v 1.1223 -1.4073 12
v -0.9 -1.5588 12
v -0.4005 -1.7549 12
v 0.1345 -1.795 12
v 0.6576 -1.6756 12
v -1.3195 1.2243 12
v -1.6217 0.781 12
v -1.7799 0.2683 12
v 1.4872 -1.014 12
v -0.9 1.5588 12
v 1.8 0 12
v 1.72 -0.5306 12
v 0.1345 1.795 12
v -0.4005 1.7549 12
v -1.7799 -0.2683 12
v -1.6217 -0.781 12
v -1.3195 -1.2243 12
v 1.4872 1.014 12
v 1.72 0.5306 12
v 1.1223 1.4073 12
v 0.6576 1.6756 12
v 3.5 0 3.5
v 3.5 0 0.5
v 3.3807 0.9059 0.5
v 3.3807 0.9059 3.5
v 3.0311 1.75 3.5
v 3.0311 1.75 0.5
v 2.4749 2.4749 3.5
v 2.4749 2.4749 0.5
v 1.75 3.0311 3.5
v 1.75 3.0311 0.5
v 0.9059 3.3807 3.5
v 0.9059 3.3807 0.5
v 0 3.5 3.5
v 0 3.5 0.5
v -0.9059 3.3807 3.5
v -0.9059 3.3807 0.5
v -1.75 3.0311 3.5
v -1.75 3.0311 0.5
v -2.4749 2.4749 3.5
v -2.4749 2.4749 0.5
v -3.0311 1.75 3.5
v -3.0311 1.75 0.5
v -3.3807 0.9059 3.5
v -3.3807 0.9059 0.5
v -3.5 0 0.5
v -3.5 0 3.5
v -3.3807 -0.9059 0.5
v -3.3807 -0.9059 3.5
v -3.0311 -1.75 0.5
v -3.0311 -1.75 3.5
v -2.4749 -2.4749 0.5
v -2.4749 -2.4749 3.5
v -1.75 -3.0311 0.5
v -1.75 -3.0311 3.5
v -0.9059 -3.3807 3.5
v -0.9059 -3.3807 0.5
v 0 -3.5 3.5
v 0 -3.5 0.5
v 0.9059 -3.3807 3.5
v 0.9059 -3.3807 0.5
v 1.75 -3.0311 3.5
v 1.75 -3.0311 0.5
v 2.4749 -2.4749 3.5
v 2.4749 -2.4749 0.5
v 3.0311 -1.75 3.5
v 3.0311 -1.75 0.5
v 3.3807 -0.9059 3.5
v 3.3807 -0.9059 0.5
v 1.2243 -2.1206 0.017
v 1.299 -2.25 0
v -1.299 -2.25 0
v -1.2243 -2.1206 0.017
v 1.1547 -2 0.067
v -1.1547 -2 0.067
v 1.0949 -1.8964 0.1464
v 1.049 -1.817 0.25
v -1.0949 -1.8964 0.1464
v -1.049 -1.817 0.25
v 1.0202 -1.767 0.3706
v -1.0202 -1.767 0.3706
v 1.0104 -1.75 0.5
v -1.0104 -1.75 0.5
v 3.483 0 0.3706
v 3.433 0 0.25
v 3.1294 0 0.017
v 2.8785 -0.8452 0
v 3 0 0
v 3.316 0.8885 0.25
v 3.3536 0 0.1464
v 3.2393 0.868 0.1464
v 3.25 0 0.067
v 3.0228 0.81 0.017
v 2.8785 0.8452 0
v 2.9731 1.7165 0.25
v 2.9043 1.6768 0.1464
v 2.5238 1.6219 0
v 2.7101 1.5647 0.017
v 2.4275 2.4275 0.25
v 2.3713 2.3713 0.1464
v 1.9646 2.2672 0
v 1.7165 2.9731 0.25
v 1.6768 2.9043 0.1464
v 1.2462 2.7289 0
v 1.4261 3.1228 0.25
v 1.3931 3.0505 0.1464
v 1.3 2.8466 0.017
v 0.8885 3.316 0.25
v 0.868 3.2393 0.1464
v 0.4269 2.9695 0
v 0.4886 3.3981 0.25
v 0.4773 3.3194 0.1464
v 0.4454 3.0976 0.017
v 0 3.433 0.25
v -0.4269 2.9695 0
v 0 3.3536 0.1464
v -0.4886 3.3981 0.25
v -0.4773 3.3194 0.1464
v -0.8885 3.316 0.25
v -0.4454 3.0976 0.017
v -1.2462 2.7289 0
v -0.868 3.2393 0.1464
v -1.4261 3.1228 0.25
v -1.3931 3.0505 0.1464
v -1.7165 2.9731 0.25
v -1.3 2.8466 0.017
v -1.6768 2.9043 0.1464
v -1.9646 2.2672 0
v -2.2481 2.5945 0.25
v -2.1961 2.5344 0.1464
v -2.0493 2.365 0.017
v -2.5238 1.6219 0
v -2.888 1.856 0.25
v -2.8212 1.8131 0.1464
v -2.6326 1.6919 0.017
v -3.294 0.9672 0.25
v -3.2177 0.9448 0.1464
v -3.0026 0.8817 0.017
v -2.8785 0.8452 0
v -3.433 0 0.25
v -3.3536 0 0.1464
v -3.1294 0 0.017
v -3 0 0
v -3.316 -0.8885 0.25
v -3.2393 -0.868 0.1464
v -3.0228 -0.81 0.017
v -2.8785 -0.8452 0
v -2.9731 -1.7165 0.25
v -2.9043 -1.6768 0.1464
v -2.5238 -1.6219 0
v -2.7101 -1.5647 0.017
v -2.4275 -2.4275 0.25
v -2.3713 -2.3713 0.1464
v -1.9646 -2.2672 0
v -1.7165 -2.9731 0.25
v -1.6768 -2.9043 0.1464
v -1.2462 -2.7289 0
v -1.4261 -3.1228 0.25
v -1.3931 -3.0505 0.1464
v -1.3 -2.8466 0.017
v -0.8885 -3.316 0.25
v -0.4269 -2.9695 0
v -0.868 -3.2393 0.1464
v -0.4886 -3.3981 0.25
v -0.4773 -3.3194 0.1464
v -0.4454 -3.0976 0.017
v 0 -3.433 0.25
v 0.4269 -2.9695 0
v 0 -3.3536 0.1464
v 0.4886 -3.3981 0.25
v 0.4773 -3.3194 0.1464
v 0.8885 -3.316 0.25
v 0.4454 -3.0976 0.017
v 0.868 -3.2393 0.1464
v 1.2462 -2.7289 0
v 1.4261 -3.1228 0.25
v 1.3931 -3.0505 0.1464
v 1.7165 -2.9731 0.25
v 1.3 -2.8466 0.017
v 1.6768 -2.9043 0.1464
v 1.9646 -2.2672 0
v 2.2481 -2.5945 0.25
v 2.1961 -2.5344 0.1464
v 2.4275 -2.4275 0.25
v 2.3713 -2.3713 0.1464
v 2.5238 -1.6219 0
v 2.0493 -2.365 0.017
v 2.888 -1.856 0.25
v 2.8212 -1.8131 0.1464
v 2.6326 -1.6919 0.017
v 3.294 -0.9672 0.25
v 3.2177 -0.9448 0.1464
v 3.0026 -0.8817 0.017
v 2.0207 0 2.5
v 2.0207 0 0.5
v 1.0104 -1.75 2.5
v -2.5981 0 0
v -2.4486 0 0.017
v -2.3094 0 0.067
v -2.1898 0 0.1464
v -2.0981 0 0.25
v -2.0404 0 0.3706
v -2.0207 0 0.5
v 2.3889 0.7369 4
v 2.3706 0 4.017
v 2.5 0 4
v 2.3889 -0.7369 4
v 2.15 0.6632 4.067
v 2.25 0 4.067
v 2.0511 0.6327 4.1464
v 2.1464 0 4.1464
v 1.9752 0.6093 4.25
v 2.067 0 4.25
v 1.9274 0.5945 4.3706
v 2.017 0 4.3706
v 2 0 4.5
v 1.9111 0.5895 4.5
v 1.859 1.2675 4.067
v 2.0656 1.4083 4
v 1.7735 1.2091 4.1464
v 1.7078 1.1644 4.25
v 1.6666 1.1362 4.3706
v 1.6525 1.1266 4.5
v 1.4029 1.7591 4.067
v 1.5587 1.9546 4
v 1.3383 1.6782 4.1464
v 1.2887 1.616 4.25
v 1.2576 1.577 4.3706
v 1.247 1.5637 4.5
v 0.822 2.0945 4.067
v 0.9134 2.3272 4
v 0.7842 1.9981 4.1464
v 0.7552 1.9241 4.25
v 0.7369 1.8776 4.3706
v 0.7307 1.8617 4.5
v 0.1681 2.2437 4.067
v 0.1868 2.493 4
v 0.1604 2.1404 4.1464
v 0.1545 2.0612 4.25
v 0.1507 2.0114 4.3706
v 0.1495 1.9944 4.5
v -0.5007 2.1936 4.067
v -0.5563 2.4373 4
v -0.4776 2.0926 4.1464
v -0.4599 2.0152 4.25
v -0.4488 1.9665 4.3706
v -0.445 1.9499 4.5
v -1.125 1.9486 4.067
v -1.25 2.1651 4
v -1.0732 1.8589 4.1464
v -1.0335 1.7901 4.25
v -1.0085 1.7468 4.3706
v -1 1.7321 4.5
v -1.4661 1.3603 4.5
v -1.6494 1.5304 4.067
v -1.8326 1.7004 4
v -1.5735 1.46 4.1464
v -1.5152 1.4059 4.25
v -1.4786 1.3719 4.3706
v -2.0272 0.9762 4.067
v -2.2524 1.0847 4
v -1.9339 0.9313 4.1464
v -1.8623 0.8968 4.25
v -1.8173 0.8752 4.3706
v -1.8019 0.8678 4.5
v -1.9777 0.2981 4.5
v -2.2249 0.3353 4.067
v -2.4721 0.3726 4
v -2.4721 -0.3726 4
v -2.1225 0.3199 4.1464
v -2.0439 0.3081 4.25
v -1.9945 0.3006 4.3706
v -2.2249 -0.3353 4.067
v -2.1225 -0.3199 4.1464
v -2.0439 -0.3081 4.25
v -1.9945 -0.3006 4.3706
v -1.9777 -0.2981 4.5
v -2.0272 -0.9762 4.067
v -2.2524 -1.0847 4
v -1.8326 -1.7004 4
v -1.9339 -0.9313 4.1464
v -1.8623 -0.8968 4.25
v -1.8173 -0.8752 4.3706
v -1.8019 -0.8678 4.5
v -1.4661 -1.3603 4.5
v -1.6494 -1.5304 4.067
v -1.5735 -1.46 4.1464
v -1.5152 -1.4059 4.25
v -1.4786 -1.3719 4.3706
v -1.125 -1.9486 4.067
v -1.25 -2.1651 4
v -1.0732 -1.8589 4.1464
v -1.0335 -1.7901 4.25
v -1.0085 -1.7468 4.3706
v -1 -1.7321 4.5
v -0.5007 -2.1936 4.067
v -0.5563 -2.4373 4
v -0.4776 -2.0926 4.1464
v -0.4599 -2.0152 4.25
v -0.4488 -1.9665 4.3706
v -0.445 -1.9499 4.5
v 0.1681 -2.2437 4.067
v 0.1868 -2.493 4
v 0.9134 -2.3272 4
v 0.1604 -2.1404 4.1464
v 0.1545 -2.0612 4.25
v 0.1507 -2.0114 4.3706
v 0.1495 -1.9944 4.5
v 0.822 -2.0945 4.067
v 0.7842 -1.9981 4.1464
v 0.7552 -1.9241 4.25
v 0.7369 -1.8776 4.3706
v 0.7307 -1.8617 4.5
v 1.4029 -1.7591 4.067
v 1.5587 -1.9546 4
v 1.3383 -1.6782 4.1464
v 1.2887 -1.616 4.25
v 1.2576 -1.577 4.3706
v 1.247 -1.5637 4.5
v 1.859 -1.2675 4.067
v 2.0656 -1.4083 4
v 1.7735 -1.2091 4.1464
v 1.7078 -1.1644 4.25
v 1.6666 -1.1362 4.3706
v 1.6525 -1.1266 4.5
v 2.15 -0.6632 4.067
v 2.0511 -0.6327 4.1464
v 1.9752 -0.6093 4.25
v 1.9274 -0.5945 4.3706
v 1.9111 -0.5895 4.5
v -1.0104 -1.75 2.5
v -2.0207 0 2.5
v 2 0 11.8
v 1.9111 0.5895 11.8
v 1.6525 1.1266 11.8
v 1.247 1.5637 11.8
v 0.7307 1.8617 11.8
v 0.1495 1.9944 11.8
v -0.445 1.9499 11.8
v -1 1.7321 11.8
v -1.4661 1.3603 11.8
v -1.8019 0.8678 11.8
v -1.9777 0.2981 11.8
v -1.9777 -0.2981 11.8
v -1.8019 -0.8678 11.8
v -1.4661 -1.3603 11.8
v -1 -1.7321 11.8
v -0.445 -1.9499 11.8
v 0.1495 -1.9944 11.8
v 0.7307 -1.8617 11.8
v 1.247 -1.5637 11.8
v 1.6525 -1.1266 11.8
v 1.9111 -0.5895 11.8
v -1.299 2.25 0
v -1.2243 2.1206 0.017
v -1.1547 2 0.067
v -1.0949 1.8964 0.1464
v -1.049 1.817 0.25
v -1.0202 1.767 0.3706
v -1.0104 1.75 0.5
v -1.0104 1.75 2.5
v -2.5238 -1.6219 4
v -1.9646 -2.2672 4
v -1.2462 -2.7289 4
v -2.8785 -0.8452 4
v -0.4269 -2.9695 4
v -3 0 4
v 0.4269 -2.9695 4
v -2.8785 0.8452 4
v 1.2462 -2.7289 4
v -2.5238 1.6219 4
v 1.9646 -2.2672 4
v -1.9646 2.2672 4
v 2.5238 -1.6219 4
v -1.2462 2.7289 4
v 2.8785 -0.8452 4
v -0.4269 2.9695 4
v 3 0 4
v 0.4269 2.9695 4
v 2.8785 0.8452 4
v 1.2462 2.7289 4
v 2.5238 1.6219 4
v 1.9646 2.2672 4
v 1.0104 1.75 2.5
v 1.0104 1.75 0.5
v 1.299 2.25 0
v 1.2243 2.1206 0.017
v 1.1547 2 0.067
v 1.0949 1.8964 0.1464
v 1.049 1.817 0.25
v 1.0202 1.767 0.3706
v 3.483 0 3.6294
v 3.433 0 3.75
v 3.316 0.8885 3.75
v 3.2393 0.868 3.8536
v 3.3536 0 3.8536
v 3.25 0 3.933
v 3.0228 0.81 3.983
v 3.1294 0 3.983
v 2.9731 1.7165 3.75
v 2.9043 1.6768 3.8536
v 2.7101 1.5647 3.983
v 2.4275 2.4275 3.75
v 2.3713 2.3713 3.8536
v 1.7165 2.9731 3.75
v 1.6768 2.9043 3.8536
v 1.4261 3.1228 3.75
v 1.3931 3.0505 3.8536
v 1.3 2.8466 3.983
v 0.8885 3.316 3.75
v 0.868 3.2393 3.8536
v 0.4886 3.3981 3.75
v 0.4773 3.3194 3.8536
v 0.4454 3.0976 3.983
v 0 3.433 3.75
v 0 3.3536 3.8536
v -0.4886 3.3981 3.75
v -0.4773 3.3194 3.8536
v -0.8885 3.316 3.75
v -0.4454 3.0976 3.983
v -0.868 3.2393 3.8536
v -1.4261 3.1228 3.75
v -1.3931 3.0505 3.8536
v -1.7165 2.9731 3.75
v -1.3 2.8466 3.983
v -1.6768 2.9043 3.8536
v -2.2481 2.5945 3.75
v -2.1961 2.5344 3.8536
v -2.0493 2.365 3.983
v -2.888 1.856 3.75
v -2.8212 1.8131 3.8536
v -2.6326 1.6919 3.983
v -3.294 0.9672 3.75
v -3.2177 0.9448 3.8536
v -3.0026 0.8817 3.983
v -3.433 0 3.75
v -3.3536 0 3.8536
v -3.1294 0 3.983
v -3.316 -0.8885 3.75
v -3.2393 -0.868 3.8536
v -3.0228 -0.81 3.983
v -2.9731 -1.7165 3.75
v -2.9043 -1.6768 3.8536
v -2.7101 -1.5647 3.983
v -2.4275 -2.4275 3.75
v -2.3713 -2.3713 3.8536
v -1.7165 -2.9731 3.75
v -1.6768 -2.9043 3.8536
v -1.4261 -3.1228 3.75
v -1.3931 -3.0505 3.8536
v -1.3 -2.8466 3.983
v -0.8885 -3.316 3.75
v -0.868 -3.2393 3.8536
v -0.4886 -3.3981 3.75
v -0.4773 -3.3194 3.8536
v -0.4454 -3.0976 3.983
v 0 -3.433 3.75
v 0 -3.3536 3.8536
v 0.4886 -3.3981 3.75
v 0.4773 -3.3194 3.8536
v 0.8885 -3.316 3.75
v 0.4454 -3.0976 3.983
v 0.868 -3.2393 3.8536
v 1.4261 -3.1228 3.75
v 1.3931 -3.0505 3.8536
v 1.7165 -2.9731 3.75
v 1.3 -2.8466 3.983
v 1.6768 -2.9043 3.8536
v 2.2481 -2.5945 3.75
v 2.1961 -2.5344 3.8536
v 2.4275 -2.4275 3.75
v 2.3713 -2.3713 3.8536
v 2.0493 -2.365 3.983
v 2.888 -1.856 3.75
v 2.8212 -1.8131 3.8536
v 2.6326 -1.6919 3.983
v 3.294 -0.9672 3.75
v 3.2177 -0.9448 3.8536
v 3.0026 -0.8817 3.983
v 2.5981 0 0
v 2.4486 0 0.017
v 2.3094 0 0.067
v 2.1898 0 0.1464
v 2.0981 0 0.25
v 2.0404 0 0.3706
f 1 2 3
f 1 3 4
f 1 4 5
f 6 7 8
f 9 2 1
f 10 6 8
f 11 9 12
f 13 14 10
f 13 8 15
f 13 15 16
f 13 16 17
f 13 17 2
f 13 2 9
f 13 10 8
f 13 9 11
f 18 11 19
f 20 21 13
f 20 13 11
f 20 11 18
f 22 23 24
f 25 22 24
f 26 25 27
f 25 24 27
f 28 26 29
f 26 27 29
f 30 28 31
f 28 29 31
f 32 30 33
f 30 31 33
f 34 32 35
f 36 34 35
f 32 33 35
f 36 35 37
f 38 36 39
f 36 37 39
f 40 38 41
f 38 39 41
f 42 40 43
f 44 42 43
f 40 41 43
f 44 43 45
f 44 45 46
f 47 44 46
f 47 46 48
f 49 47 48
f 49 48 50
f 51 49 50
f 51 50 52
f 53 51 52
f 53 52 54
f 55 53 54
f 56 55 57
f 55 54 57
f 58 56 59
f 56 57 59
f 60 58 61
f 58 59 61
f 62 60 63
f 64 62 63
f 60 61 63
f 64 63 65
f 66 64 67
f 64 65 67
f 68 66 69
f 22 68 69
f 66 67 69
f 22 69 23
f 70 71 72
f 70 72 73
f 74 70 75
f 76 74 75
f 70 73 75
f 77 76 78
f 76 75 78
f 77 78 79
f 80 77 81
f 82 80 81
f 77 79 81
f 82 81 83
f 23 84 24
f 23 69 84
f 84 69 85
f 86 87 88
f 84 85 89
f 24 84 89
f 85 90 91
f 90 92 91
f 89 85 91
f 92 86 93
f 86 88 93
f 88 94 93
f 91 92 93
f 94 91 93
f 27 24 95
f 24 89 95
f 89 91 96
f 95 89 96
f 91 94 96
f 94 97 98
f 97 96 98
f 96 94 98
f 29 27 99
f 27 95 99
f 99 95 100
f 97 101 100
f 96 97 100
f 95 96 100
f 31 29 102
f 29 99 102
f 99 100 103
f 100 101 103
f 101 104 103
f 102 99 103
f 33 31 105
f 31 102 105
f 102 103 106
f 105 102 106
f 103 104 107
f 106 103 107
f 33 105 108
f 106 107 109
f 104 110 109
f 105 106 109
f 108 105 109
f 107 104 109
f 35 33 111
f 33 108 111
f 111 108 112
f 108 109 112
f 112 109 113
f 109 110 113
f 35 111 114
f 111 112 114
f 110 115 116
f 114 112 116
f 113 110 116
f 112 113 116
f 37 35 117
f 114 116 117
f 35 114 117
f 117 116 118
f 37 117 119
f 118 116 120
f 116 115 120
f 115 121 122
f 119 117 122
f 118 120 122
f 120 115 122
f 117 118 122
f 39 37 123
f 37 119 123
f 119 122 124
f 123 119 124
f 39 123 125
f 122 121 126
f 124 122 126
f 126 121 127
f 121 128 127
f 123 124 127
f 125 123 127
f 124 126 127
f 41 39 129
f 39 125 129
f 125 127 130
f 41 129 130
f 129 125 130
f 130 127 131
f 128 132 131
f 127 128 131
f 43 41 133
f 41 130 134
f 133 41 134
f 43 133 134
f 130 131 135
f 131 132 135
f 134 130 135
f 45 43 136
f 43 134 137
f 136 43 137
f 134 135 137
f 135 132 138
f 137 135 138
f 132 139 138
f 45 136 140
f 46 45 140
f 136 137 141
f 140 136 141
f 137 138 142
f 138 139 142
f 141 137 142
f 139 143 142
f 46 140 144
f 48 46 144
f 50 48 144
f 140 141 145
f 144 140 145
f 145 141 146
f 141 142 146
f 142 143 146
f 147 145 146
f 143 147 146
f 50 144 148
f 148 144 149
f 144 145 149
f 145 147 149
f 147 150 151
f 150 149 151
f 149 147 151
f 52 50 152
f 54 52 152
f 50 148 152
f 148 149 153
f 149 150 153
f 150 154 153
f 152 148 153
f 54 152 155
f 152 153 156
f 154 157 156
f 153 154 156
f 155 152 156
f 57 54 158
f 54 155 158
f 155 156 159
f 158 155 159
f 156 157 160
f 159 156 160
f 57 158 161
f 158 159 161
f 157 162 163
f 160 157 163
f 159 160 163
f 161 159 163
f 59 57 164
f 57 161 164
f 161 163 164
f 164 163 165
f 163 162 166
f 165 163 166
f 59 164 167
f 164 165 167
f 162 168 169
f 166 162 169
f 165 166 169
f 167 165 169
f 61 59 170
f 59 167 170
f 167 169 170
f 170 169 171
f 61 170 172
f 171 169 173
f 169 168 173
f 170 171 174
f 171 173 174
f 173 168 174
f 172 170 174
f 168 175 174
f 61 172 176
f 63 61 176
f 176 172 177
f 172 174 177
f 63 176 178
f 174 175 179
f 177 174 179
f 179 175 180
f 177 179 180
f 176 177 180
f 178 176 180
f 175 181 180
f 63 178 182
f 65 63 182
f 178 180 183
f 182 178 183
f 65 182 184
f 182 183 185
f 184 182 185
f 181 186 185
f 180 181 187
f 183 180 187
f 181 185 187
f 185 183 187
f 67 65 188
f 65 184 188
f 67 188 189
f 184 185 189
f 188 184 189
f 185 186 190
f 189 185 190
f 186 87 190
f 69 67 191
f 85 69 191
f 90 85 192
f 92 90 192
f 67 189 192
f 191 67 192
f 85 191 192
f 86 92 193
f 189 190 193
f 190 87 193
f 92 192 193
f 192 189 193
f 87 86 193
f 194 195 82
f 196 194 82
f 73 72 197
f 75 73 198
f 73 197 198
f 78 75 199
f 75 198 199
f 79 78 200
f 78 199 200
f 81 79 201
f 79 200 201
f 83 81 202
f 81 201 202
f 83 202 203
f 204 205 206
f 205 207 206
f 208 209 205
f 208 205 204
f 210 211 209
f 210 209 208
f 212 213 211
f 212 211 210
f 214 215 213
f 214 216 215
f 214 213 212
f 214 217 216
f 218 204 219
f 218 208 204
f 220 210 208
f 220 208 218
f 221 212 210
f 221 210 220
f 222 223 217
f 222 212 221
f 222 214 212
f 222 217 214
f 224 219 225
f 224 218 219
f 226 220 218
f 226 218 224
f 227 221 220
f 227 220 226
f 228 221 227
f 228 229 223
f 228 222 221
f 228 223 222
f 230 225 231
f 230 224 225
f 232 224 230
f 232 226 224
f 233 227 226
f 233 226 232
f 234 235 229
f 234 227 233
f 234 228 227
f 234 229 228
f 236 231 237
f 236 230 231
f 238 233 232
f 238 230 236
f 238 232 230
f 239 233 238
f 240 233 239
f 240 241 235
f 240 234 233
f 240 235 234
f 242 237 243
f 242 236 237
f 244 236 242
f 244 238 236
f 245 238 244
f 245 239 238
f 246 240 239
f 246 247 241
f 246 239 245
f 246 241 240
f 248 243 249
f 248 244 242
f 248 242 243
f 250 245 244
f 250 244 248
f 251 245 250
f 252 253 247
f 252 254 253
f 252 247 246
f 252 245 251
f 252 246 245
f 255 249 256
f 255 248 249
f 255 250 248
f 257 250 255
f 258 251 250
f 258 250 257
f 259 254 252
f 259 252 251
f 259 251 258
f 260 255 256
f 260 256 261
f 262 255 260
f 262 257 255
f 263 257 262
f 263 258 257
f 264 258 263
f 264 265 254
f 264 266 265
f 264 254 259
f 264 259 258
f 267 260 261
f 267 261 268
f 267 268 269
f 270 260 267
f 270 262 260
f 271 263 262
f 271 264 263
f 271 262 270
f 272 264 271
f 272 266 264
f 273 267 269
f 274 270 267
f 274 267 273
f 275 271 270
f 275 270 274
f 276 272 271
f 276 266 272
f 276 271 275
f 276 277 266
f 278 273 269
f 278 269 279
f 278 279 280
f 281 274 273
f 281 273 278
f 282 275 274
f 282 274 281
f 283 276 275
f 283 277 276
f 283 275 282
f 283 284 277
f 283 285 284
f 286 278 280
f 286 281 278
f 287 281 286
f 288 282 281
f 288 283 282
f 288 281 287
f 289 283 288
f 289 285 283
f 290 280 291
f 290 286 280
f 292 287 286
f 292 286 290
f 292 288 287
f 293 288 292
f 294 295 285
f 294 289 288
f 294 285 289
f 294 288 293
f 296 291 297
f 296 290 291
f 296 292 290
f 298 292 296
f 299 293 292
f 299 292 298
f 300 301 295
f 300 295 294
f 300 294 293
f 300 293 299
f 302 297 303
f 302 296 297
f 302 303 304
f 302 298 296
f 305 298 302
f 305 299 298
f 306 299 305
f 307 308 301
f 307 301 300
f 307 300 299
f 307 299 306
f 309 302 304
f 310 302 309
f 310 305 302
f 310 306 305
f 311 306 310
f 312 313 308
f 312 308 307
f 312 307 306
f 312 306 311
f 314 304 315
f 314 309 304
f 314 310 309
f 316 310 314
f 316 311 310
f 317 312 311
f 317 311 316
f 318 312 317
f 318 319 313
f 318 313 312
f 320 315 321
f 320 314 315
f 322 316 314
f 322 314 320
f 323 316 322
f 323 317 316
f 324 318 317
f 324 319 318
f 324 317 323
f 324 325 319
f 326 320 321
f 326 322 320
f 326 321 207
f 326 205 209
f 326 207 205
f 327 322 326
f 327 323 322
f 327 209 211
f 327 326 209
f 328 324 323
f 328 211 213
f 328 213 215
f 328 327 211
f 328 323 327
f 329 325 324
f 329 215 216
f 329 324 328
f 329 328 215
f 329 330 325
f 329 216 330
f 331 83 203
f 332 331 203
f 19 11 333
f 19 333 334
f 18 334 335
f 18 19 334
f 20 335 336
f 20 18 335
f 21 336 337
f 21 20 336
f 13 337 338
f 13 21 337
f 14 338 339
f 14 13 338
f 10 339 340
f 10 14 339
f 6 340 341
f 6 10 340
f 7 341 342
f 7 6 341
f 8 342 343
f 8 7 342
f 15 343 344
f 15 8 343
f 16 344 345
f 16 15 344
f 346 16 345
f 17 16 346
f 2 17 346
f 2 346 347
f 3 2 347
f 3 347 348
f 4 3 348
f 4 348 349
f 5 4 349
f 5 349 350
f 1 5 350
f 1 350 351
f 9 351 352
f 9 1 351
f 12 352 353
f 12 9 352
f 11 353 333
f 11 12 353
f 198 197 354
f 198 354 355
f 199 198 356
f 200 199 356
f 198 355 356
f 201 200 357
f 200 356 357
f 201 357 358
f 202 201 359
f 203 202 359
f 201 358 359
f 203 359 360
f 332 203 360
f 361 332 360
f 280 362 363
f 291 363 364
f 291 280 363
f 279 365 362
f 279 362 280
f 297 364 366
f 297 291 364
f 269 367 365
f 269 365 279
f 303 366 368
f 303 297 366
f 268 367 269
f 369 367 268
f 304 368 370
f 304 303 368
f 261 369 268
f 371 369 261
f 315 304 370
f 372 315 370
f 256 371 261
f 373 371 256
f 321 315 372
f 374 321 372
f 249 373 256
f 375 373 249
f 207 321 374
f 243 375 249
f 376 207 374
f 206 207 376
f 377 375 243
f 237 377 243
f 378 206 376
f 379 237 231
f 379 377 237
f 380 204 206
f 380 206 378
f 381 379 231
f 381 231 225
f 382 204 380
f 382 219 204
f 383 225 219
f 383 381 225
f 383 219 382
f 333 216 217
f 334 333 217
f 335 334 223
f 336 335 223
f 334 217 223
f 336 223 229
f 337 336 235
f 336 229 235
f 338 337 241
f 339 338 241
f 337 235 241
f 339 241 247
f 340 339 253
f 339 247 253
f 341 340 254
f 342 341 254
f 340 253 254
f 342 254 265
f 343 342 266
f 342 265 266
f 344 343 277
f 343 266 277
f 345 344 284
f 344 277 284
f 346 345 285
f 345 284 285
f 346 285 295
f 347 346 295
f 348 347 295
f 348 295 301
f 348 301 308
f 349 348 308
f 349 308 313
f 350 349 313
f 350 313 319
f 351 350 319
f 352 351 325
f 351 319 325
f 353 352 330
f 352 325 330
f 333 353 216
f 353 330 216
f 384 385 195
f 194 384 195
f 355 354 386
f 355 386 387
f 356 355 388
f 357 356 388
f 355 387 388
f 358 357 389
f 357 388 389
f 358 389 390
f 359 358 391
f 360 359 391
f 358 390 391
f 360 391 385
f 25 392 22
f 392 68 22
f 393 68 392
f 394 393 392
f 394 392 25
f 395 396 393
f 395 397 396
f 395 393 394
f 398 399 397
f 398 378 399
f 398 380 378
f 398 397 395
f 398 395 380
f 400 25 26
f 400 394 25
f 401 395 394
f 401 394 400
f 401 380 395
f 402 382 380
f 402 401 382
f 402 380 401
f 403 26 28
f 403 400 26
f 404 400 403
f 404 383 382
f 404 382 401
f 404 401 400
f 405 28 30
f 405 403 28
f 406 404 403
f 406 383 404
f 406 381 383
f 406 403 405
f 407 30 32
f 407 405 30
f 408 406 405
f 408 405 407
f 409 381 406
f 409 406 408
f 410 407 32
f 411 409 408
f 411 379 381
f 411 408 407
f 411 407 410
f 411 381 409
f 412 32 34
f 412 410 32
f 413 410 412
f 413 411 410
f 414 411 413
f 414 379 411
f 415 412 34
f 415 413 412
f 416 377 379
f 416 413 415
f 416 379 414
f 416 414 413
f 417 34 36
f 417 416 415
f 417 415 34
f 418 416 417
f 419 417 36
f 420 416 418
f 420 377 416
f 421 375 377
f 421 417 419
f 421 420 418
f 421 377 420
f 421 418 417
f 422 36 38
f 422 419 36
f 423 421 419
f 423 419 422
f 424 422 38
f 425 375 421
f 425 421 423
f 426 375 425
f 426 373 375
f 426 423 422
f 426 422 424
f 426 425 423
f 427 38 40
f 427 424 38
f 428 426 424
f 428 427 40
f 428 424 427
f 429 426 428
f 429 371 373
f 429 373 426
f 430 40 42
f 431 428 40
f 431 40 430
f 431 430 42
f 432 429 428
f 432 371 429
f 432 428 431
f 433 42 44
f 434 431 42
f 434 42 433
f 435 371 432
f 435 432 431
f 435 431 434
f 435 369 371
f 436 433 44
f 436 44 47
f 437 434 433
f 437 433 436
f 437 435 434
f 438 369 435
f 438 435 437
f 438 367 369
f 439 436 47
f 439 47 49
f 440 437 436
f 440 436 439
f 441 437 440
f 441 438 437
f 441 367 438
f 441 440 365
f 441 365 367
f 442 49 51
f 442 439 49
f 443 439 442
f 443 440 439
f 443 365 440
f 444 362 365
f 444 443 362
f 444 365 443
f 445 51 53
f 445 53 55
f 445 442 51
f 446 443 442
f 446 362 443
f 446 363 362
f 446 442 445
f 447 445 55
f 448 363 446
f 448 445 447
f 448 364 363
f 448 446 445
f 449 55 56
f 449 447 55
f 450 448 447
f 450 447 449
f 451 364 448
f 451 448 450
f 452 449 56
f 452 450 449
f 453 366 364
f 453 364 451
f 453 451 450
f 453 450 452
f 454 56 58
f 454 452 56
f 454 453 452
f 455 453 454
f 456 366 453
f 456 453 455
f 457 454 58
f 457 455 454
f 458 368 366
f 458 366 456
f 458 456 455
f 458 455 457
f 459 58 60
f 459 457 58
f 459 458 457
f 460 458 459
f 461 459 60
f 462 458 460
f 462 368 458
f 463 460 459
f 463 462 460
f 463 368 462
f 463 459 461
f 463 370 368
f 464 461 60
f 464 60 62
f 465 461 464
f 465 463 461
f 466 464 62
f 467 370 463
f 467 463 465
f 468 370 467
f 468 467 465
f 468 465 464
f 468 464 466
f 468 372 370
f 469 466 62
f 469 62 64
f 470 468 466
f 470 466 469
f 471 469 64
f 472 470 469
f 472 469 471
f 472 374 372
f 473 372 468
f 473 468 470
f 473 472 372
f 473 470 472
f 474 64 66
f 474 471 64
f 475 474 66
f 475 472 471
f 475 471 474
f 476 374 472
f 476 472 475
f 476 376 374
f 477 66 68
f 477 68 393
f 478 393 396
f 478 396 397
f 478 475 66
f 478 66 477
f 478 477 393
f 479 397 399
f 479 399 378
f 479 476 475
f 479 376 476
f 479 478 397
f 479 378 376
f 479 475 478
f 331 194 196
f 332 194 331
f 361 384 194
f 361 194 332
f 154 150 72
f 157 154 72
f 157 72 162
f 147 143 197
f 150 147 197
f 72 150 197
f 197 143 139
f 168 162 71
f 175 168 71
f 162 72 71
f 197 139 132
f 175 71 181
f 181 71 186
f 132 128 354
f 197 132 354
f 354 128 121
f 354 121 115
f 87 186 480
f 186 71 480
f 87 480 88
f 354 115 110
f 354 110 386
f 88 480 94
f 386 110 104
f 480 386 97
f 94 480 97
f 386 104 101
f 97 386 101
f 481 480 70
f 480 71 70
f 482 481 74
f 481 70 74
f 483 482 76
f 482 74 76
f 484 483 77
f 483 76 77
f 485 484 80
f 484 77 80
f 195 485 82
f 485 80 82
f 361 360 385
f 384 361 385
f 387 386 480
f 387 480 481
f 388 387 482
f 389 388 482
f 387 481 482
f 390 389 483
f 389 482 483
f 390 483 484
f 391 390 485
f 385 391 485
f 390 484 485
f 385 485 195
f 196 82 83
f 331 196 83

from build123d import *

# Parameters (mm, degrees)
SKETCH1_R           = 3.5
BOSS_EXTRUDE1_DEPTH = 4
SKETCH2_R           = 2
BOSS_EXTRUDE2_DEPTH = 8
CUT_EXTRUDE1_DEPTH  = 2.5
FILLET1_R           = 0.5
CHAMFER1_SIZE       = 0.2


with BuildPart() as part:
    # Sketch1 → Boss-Extrude1 (new body)
    with BuildSketch(Plane.XY):
        Circle(SKETCH1_R)
    extrude(amount=BOSS_EXTRUDE1_DEPTH)

    # Sketch2 → Boss-Extrude2 (add)
    with BuildSketch(Plane.XY.offset(4)):
        Circle(SKETCH2_R)
    extrude(amount=BOSS_EXTRUDE2_DEPTH)

    # Sketch3 → Cut-Extrude1 (cut)
    with BuildSketch(Plane(origin=(0, 0, 0), x_dir=(-1, 0, 0), z_dir=(0, 0, -1))):
        Polygon((2.020725942, 0), (1.010362971, 1.75), (-1.010362971, 1.75), (-2.020725942, 0), (-1.010362971, -1.75), (1.010362971, -1.75), align=None)
    extrude(amount=-CUT_EXTRUDE1_DEPTH, mode=Mode.SUBTRACT)

    # Fillet1
    fillet1_edges = [part.edges().sort_by_distance(p)[0] for p in [
        (-1.515544457, -0.875, 0),
        (-1.515544457, 0.875, 0),
        (0, 1.75, 0),
        (1.515544457, 0.875, 0),
        (1.515544457, -0.875, 0),
        (0, -1.75, 0),
        (-3.5, 0, 0),
        (-3.5, 0, 4),
        (-2, 0, 4),
    ]]
    fillet(fillet1_edges, radius=FILLET1_R)

    # Chamfer1
    chamfer1_edges = [part.edges().sort_by_distance(p)[0] for p in [
        (-2, 0, 12),
    ]]
    chamfer(chamfer1_edges, length=CHAMFER1_SIZE)


solid = part.part
